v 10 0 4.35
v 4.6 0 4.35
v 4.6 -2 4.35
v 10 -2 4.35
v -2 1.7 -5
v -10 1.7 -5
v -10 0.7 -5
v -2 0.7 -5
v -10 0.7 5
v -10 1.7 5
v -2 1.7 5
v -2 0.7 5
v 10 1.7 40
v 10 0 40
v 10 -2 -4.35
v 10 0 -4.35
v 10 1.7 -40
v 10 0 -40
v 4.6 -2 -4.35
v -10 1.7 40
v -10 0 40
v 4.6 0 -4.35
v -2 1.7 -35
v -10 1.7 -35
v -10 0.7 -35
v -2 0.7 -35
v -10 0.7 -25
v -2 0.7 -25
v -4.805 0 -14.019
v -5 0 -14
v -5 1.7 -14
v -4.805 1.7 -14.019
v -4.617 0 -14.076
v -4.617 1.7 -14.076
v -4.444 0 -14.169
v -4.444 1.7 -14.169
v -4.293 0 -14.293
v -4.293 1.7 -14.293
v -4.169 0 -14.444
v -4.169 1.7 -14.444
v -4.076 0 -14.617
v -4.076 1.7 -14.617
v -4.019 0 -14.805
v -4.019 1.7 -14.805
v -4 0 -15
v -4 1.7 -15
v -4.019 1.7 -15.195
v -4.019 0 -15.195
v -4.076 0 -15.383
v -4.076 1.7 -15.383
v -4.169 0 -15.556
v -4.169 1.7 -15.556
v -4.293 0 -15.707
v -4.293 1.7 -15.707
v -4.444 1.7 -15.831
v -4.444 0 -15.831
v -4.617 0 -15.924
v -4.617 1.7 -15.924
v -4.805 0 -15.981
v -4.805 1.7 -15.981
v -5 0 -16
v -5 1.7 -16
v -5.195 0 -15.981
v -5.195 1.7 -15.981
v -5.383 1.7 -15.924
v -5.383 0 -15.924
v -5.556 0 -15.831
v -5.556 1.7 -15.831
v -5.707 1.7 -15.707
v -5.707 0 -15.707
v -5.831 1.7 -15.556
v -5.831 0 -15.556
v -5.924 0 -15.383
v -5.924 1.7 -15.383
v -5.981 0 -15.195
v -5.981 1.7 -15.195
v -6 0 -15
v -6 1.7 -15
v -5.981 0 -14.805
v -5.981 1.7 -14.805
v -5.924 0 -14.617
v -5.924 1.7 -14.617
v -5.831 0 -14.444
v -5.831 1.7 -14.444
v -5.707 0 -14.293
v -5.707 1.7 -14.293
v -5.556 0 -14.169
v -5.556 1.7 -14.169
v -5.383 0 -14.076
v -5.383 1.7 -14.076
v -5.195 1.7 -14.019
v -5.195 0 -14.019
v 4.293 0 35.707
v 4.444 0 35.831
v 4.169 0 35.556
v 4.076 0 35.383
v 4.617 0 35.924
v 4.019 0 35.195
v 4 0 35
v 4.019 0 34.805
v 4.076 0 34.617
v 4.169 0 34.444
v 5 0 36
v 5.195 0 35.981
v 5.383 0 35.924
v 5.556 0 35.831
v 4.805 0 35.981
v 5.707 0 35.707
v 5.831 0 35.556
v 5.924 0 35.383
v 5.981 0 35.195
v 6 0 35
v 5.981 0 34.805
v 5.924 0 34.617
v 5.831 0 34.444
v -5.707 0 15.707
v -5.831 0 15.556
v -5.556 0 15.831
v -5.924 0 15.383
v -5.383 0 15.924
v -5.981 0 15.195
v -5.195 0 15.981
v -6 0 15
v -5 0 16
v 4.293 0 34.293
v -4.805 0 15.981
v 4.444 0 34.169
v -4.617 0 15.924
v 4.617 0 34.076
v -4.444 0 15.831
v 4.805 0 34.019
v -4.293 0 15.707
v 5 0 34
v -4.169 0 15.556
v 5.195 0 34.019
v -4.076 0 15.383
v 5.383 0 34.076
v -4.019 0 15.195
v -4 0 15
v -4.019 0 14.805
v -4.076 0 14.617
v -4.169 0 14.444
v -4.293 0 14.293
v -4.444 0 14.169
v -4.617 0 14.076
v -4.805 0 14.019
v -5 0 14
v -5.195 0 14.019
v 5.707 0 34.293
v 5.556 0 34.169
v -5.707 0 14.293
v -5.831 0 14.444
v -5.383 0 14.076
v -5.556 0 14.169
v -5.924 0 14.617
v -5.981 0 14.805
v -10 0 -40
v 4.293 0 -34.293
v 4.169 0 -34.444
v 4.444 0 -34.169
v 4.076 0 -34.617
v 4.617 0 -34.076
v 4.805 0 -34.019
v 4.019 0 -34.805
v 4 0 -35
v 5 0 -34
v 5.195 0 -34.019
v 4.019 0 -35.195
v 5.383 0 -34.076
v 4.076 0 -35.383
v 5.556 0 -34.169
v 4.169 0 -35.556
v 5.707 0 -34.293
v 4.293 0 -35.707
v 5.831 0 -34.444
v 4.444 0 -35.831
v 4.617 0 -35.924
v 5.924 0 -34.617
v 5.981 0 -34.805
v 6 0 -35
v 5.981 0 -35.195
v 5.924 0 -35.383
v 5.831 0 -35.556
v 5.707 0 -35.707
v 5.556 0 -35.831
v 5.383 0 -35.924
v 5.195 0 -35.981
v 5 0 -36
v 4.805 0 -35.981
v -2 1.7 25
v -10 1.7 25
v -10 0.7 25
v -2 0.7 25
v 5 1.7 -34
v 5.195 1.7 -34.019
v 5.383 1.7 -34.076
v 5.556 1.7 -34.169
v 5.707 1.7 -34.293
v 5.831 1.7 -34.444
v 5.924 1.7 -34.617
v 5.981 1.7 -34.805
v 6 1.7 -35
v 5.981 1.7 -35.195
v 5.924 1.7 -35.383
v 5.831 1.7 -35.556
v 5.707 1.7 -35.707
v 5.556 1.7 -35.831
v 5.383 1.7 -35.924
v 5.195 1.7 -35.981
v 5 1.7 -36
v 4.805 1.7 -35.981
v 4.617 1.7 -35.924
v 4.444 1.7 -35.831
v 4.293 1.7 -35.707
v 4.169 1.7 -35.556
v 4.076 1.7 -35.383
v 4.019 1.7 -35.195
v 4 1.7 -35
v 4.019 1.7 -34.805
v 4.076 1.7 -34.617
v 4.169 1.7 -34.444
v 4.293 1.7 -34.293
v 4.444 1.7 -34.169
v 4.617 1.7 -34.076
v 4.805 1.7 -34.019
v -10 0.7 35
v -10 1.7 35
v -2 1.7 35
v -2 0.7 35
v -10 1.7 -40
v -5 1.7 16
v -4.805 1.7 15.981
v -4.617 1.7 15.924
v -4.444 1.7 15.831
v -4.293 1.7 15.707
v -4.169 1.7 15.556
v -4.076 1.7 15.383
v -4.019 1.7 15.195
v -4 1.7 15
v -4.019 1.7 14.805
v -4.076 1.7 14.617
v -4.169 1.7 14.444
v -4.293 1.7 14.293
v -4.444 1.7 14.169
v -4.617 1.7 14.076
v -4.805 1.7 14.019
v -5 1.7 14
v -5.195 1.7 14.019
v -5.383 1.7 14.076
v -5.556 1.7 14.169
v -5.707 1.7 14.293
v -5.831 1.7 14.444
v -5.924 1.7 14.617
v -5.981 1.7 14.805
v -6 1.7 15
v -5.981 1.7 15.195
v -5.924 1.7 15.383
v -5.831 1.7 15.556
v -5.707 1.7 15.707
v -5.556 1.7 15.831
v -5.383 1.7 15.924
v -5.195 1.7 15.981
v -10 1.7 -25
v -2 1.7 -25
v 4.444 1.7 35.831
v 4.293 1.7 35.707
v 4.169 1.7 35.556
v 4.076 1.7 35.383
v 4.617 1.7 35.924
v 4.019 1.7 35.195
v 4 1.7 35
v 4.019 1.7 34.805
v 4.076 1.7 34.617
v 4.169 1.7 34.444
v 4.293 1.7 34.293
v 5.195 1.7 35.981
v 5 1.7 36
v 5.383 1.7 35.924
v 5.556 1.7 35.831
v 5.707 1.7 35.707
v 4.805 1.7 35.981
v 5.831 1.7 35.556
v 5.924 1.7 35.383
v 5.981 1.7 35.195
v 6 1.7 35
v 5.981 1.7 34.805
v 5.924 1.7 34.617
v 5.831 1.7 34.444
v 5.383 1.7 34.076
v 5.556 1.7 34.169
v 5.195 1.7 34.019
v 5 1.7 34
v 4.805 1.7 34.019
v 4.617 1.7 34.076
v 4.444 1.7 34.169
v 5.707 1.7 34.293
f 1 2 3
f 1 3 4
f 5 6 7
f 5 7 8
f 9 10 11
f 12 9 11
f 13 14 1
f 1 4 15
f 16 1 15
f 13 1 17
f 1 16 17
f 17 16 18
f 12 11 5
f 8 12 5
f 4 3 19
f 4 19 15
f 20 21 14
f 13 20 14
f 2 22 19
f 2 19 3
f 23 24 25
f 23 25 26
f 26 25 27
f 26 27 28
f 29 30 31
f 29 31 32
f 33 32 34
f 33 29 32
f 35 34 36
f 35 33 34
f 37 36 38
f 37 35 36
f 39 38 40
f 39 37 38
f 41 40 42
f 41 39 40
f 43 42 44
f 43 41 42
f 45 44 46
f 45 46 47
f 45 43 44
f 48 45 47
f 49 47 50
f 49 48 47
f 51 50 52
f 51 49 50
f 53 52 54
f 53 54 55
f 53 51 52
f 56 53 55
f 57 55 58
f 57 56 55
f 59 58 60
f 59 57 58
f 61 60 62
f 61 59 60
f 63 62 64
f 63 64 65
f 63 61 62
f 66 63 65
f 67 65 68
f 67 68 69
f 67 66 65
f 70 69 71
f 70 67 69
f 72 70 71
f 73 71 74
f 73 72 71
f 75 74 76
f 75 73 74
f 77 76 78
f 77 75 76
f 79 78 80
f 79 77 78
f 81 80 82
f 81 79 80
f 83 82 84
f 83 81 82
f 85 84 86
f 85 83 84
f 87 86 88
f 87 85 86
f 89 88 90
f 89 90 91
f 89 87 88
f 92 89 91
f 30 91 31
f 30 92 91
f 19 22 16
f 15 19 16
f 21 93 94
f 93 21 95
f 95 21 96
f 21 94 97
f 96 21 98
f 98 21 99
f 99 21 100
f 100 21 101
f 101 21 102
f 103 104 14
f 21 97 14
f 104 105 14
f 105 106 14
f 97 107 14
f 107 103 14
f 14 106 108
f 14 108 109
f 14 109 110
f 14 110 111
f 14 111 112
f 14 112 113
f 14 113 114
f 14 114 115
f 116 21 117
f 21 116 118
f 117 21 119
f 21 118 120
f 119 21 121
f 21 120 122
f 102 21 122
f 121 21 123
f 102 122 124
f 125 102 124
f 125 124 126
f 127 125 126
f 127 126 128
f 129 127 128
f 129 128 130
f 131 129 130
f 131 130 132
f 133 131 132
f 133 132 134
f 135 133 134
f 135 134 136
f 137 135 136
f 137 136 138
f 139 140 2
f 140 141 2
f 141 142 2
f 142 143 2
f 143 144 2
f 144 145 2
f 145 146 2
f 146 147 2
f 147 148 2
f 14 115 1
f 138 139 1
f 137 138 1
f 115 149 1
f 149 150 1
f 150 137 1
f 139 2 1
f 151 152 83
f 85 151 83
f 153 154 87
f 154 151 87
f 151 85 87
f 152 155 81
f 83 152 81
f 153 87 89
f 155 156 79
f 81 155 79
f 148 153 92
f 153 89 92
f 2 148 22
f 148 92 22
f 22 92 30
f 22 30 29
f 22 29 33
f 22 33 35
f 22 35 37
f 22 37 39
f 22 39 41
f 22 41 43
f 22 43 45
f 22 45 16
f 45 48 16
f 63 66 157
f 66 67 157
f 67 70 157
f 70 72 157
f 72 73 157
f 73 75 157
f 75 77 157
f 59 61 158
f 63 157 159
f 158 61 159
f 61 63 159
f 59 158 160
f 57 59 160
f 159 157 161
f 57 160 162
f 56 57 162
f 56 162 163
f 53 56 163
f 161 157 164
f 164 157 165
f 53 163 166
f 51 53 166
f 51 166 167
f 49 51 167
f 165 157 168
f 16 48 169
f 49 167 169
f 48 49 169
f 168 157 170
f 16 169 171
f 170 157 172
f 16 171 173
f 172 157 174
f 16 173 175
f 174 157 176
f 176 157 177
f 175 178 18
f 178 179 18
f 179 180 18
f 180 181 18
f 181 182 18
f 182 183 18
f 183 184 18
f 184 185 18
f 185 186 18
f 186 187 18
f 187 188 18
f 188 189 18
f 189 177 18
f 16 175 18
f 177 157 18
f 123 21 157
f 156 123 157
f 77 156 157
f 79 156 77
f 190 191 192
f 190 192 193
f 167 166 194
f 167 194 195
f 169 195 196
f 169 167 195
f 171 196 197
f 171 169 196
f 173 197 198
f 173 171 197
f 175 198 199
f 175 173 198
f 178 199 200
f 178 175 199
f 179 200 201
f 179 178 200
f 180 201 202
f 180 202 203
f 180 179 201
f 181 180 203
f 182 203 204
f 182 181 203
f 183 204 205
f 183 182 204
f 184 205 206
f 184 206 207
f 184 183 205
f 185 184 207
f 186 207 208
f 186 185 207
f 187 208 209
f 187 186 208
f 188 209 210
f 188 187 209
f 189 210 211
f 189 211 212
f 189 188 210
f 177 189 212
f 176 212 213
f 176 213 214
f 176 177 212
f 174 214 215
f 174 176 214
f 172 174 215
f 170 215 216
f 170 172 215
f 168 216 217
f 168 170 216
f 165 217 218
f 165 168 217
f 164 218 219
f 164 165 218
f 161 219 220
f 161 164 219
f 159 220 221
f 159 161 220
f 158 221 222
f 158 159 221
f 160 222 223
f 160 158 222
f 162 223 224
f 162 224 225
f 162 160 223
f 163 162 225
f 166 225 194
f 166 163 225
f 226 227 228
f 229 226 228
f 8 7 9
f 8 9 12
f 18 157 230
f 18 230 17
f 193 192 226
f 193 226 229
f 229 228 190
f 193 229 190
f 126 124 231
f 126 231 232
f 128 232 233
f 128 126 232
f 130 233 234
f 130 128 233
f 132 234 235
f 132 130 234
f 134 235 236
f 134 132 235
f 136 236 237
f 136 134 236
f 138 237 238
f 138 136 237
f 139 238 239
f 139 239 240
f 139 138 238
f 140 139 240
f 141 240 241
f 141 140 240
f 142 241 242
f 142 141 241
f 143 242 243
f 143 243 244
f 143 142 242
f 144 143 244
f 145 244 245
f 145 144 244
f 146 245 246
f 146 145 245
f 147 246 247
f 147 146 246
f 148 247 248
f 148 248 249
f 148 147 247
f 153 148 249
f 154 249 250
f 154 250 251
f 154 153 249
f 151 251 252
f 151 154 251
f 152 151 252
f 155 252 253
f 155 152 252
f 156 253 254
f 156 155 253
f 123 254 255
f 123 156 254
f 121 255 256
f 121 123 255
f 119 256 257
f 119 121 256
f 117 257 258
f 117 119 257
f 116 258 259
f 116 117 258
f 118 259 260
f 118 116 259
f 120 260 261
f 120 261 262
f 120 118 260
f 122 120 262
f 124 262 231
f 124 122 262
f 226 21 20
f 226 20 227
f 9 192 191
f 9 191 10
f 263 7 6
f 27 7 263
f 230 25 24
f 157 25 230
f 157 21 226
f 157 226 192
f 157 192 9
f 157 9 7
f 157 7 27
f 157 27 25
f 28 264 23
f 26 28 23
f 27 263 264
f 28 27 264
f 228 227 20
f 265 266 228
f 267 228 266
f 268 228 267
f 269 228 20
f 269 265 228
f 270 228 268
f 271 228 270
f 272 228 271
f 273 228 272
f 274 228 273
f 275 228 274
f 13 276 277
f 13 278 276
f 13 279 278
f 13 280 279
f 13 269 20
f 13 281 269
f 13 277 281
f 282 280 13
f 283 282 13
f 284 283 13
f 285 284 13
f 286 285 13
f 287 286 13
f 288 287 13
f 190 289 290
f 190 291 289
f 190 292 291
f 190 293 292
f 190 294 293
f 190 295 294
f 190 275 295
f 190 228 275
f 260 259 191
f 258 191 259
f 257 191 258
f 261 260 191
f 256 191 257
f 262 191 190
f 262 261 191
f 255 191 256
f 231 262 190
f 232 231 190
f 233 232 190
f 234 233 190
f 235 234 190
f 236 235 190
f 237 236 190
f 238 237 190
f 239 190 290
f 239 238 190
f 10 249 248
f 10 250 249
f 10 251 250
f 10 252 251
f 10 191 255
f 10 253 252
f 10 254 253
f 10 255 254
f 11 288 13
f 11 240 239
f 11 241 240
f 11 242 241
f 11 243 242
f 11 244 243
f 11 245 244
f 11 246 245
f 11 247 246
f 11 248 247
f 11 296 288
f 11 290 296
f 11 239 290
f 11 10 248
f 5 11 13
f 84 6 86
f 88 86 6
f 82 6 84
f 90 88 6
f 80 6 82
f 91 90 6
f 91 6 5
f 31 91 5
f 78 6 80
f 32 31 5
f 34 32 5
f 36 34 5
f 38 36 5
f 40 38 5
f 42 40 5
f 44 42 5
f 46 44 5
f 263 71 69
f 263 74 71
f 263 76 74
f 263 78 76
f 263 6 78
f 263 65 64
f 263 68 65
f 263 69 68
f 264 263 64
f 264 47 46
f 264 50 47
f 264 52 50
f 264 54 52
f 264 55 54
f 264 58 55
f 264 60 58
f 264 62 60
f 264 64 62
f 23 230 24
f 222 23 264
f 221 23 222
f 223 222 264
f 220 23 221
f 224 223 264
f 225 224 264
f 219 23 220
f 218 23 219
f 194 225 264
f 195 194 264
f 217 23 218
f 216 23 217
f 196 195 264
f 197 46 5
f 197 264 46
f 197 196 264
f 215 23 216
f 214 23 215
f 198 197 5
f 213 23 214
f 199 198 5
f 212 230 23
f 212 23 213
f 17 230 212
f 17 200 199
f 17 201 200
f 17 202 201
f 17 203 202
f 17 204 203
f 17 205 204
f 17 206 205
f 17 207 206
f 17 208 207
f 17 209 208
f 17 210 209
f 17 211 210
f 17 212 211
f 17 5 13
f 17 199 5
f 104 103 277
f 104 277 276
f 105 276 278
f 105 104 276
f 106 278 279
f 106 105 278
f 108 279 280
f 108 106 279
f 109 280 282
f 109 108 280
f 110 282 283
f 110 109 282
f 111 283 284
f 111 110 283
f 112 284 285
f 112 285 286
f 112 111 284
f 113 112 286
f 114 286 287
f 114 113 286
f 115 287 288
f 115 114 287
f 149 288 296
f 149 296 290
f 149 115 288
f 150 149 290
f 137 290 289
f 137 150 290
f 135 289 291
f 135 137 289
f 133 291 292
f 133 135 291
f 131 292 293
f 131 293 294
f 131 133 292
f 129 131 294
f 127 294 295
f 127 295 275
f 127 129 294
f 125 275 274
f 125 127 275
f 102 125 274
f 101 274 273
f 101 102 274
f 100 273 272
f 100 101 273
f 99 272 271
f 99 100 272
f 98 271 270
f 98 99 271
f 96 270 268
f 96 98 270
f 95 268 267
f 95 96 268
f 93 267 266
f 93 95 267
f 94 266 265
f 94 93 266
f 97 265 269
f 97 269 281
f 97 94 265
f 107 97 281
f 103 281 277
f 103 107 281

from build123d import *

# Parameters (mm, degrees)
SKETCH_1_W          = 20
SKETCH_1_H          = 80
SKETCH_1_R          = 1
EXTRUDE_1_DEPTH     = 1.7
SKETCH_2_W          = 8
SKETCH_2_H          = 10
CUT_EXTRUDE_1_DEPTH = 1
SKETCH_3_W          = 5.4
SKETCH_3_H          = 8.7
EXTRUDE_2_DEPTH     = 2


with BuildPart() as part:
    # 草图1 → 凸台-拉伸1 (new body)
    with BuildSketch(Plane(origin=(0, 0, 0), x_dir=(1, 0, 0), z_dir=(0, 1, 0))):
        Rectangle(SKETCH_1_W, SKETCH_1_H)
        with Locations(Location((-5, 15, 0), (0, 0, 270))):
            Circle(SKETCH_1_R, mode=Mode.SUBTRACT)
        with Locations(Location((-5, -15, 0), (0, 0, 270))):
            Circle(SKETCH_1_R, mode=Mode.SUBTRACT)
        with Locations(Location((5, 35, 0), (0, 0, 270))):
            Circle(SKETCH_1_R, mode=Mode.SUBTRACT)
        with Locations(Location((5, -35, 0), (0, 0, 270))):
            Circle(SKETCH_1_R, mode=Mode.SUBTRACT)
    extrude(amount=EXTRUDE_1_DEPTH)

    # 草图2 → 切除-拉伸1 (cut)
    with BuildSketch(Plane(origin=(0, 1.7, 0), x_dir=(1, 0, 0), z_dir=(0, 1, 0))):
        with Locations((-6, -30)):
            Rectangle(SKETCH_2_W, SKETCH_2_H)
        with Locations((-6, 0)):
            Rectangle(SKETCH_2_W, SKETCH_2_H)
        with Locations((-6, 30)):
            Rectangle(SKETCH_2_W, SKETCH_2_H)
    extrude(amount=-CUT_EXTRUDE_1_DEPTH, mode=Mode.SUBTRACT)

    # 草图3 → 凸台-拉伸2 (add)
    with BuildSketch(Plane.XZ):
        with Locations((7.3, 0)):
            Rectangle(SKETCH_3_W, SKETCH_3_H)
    extrude(amount=EXTRUDE_2_DEPTH)


solid = part.part
